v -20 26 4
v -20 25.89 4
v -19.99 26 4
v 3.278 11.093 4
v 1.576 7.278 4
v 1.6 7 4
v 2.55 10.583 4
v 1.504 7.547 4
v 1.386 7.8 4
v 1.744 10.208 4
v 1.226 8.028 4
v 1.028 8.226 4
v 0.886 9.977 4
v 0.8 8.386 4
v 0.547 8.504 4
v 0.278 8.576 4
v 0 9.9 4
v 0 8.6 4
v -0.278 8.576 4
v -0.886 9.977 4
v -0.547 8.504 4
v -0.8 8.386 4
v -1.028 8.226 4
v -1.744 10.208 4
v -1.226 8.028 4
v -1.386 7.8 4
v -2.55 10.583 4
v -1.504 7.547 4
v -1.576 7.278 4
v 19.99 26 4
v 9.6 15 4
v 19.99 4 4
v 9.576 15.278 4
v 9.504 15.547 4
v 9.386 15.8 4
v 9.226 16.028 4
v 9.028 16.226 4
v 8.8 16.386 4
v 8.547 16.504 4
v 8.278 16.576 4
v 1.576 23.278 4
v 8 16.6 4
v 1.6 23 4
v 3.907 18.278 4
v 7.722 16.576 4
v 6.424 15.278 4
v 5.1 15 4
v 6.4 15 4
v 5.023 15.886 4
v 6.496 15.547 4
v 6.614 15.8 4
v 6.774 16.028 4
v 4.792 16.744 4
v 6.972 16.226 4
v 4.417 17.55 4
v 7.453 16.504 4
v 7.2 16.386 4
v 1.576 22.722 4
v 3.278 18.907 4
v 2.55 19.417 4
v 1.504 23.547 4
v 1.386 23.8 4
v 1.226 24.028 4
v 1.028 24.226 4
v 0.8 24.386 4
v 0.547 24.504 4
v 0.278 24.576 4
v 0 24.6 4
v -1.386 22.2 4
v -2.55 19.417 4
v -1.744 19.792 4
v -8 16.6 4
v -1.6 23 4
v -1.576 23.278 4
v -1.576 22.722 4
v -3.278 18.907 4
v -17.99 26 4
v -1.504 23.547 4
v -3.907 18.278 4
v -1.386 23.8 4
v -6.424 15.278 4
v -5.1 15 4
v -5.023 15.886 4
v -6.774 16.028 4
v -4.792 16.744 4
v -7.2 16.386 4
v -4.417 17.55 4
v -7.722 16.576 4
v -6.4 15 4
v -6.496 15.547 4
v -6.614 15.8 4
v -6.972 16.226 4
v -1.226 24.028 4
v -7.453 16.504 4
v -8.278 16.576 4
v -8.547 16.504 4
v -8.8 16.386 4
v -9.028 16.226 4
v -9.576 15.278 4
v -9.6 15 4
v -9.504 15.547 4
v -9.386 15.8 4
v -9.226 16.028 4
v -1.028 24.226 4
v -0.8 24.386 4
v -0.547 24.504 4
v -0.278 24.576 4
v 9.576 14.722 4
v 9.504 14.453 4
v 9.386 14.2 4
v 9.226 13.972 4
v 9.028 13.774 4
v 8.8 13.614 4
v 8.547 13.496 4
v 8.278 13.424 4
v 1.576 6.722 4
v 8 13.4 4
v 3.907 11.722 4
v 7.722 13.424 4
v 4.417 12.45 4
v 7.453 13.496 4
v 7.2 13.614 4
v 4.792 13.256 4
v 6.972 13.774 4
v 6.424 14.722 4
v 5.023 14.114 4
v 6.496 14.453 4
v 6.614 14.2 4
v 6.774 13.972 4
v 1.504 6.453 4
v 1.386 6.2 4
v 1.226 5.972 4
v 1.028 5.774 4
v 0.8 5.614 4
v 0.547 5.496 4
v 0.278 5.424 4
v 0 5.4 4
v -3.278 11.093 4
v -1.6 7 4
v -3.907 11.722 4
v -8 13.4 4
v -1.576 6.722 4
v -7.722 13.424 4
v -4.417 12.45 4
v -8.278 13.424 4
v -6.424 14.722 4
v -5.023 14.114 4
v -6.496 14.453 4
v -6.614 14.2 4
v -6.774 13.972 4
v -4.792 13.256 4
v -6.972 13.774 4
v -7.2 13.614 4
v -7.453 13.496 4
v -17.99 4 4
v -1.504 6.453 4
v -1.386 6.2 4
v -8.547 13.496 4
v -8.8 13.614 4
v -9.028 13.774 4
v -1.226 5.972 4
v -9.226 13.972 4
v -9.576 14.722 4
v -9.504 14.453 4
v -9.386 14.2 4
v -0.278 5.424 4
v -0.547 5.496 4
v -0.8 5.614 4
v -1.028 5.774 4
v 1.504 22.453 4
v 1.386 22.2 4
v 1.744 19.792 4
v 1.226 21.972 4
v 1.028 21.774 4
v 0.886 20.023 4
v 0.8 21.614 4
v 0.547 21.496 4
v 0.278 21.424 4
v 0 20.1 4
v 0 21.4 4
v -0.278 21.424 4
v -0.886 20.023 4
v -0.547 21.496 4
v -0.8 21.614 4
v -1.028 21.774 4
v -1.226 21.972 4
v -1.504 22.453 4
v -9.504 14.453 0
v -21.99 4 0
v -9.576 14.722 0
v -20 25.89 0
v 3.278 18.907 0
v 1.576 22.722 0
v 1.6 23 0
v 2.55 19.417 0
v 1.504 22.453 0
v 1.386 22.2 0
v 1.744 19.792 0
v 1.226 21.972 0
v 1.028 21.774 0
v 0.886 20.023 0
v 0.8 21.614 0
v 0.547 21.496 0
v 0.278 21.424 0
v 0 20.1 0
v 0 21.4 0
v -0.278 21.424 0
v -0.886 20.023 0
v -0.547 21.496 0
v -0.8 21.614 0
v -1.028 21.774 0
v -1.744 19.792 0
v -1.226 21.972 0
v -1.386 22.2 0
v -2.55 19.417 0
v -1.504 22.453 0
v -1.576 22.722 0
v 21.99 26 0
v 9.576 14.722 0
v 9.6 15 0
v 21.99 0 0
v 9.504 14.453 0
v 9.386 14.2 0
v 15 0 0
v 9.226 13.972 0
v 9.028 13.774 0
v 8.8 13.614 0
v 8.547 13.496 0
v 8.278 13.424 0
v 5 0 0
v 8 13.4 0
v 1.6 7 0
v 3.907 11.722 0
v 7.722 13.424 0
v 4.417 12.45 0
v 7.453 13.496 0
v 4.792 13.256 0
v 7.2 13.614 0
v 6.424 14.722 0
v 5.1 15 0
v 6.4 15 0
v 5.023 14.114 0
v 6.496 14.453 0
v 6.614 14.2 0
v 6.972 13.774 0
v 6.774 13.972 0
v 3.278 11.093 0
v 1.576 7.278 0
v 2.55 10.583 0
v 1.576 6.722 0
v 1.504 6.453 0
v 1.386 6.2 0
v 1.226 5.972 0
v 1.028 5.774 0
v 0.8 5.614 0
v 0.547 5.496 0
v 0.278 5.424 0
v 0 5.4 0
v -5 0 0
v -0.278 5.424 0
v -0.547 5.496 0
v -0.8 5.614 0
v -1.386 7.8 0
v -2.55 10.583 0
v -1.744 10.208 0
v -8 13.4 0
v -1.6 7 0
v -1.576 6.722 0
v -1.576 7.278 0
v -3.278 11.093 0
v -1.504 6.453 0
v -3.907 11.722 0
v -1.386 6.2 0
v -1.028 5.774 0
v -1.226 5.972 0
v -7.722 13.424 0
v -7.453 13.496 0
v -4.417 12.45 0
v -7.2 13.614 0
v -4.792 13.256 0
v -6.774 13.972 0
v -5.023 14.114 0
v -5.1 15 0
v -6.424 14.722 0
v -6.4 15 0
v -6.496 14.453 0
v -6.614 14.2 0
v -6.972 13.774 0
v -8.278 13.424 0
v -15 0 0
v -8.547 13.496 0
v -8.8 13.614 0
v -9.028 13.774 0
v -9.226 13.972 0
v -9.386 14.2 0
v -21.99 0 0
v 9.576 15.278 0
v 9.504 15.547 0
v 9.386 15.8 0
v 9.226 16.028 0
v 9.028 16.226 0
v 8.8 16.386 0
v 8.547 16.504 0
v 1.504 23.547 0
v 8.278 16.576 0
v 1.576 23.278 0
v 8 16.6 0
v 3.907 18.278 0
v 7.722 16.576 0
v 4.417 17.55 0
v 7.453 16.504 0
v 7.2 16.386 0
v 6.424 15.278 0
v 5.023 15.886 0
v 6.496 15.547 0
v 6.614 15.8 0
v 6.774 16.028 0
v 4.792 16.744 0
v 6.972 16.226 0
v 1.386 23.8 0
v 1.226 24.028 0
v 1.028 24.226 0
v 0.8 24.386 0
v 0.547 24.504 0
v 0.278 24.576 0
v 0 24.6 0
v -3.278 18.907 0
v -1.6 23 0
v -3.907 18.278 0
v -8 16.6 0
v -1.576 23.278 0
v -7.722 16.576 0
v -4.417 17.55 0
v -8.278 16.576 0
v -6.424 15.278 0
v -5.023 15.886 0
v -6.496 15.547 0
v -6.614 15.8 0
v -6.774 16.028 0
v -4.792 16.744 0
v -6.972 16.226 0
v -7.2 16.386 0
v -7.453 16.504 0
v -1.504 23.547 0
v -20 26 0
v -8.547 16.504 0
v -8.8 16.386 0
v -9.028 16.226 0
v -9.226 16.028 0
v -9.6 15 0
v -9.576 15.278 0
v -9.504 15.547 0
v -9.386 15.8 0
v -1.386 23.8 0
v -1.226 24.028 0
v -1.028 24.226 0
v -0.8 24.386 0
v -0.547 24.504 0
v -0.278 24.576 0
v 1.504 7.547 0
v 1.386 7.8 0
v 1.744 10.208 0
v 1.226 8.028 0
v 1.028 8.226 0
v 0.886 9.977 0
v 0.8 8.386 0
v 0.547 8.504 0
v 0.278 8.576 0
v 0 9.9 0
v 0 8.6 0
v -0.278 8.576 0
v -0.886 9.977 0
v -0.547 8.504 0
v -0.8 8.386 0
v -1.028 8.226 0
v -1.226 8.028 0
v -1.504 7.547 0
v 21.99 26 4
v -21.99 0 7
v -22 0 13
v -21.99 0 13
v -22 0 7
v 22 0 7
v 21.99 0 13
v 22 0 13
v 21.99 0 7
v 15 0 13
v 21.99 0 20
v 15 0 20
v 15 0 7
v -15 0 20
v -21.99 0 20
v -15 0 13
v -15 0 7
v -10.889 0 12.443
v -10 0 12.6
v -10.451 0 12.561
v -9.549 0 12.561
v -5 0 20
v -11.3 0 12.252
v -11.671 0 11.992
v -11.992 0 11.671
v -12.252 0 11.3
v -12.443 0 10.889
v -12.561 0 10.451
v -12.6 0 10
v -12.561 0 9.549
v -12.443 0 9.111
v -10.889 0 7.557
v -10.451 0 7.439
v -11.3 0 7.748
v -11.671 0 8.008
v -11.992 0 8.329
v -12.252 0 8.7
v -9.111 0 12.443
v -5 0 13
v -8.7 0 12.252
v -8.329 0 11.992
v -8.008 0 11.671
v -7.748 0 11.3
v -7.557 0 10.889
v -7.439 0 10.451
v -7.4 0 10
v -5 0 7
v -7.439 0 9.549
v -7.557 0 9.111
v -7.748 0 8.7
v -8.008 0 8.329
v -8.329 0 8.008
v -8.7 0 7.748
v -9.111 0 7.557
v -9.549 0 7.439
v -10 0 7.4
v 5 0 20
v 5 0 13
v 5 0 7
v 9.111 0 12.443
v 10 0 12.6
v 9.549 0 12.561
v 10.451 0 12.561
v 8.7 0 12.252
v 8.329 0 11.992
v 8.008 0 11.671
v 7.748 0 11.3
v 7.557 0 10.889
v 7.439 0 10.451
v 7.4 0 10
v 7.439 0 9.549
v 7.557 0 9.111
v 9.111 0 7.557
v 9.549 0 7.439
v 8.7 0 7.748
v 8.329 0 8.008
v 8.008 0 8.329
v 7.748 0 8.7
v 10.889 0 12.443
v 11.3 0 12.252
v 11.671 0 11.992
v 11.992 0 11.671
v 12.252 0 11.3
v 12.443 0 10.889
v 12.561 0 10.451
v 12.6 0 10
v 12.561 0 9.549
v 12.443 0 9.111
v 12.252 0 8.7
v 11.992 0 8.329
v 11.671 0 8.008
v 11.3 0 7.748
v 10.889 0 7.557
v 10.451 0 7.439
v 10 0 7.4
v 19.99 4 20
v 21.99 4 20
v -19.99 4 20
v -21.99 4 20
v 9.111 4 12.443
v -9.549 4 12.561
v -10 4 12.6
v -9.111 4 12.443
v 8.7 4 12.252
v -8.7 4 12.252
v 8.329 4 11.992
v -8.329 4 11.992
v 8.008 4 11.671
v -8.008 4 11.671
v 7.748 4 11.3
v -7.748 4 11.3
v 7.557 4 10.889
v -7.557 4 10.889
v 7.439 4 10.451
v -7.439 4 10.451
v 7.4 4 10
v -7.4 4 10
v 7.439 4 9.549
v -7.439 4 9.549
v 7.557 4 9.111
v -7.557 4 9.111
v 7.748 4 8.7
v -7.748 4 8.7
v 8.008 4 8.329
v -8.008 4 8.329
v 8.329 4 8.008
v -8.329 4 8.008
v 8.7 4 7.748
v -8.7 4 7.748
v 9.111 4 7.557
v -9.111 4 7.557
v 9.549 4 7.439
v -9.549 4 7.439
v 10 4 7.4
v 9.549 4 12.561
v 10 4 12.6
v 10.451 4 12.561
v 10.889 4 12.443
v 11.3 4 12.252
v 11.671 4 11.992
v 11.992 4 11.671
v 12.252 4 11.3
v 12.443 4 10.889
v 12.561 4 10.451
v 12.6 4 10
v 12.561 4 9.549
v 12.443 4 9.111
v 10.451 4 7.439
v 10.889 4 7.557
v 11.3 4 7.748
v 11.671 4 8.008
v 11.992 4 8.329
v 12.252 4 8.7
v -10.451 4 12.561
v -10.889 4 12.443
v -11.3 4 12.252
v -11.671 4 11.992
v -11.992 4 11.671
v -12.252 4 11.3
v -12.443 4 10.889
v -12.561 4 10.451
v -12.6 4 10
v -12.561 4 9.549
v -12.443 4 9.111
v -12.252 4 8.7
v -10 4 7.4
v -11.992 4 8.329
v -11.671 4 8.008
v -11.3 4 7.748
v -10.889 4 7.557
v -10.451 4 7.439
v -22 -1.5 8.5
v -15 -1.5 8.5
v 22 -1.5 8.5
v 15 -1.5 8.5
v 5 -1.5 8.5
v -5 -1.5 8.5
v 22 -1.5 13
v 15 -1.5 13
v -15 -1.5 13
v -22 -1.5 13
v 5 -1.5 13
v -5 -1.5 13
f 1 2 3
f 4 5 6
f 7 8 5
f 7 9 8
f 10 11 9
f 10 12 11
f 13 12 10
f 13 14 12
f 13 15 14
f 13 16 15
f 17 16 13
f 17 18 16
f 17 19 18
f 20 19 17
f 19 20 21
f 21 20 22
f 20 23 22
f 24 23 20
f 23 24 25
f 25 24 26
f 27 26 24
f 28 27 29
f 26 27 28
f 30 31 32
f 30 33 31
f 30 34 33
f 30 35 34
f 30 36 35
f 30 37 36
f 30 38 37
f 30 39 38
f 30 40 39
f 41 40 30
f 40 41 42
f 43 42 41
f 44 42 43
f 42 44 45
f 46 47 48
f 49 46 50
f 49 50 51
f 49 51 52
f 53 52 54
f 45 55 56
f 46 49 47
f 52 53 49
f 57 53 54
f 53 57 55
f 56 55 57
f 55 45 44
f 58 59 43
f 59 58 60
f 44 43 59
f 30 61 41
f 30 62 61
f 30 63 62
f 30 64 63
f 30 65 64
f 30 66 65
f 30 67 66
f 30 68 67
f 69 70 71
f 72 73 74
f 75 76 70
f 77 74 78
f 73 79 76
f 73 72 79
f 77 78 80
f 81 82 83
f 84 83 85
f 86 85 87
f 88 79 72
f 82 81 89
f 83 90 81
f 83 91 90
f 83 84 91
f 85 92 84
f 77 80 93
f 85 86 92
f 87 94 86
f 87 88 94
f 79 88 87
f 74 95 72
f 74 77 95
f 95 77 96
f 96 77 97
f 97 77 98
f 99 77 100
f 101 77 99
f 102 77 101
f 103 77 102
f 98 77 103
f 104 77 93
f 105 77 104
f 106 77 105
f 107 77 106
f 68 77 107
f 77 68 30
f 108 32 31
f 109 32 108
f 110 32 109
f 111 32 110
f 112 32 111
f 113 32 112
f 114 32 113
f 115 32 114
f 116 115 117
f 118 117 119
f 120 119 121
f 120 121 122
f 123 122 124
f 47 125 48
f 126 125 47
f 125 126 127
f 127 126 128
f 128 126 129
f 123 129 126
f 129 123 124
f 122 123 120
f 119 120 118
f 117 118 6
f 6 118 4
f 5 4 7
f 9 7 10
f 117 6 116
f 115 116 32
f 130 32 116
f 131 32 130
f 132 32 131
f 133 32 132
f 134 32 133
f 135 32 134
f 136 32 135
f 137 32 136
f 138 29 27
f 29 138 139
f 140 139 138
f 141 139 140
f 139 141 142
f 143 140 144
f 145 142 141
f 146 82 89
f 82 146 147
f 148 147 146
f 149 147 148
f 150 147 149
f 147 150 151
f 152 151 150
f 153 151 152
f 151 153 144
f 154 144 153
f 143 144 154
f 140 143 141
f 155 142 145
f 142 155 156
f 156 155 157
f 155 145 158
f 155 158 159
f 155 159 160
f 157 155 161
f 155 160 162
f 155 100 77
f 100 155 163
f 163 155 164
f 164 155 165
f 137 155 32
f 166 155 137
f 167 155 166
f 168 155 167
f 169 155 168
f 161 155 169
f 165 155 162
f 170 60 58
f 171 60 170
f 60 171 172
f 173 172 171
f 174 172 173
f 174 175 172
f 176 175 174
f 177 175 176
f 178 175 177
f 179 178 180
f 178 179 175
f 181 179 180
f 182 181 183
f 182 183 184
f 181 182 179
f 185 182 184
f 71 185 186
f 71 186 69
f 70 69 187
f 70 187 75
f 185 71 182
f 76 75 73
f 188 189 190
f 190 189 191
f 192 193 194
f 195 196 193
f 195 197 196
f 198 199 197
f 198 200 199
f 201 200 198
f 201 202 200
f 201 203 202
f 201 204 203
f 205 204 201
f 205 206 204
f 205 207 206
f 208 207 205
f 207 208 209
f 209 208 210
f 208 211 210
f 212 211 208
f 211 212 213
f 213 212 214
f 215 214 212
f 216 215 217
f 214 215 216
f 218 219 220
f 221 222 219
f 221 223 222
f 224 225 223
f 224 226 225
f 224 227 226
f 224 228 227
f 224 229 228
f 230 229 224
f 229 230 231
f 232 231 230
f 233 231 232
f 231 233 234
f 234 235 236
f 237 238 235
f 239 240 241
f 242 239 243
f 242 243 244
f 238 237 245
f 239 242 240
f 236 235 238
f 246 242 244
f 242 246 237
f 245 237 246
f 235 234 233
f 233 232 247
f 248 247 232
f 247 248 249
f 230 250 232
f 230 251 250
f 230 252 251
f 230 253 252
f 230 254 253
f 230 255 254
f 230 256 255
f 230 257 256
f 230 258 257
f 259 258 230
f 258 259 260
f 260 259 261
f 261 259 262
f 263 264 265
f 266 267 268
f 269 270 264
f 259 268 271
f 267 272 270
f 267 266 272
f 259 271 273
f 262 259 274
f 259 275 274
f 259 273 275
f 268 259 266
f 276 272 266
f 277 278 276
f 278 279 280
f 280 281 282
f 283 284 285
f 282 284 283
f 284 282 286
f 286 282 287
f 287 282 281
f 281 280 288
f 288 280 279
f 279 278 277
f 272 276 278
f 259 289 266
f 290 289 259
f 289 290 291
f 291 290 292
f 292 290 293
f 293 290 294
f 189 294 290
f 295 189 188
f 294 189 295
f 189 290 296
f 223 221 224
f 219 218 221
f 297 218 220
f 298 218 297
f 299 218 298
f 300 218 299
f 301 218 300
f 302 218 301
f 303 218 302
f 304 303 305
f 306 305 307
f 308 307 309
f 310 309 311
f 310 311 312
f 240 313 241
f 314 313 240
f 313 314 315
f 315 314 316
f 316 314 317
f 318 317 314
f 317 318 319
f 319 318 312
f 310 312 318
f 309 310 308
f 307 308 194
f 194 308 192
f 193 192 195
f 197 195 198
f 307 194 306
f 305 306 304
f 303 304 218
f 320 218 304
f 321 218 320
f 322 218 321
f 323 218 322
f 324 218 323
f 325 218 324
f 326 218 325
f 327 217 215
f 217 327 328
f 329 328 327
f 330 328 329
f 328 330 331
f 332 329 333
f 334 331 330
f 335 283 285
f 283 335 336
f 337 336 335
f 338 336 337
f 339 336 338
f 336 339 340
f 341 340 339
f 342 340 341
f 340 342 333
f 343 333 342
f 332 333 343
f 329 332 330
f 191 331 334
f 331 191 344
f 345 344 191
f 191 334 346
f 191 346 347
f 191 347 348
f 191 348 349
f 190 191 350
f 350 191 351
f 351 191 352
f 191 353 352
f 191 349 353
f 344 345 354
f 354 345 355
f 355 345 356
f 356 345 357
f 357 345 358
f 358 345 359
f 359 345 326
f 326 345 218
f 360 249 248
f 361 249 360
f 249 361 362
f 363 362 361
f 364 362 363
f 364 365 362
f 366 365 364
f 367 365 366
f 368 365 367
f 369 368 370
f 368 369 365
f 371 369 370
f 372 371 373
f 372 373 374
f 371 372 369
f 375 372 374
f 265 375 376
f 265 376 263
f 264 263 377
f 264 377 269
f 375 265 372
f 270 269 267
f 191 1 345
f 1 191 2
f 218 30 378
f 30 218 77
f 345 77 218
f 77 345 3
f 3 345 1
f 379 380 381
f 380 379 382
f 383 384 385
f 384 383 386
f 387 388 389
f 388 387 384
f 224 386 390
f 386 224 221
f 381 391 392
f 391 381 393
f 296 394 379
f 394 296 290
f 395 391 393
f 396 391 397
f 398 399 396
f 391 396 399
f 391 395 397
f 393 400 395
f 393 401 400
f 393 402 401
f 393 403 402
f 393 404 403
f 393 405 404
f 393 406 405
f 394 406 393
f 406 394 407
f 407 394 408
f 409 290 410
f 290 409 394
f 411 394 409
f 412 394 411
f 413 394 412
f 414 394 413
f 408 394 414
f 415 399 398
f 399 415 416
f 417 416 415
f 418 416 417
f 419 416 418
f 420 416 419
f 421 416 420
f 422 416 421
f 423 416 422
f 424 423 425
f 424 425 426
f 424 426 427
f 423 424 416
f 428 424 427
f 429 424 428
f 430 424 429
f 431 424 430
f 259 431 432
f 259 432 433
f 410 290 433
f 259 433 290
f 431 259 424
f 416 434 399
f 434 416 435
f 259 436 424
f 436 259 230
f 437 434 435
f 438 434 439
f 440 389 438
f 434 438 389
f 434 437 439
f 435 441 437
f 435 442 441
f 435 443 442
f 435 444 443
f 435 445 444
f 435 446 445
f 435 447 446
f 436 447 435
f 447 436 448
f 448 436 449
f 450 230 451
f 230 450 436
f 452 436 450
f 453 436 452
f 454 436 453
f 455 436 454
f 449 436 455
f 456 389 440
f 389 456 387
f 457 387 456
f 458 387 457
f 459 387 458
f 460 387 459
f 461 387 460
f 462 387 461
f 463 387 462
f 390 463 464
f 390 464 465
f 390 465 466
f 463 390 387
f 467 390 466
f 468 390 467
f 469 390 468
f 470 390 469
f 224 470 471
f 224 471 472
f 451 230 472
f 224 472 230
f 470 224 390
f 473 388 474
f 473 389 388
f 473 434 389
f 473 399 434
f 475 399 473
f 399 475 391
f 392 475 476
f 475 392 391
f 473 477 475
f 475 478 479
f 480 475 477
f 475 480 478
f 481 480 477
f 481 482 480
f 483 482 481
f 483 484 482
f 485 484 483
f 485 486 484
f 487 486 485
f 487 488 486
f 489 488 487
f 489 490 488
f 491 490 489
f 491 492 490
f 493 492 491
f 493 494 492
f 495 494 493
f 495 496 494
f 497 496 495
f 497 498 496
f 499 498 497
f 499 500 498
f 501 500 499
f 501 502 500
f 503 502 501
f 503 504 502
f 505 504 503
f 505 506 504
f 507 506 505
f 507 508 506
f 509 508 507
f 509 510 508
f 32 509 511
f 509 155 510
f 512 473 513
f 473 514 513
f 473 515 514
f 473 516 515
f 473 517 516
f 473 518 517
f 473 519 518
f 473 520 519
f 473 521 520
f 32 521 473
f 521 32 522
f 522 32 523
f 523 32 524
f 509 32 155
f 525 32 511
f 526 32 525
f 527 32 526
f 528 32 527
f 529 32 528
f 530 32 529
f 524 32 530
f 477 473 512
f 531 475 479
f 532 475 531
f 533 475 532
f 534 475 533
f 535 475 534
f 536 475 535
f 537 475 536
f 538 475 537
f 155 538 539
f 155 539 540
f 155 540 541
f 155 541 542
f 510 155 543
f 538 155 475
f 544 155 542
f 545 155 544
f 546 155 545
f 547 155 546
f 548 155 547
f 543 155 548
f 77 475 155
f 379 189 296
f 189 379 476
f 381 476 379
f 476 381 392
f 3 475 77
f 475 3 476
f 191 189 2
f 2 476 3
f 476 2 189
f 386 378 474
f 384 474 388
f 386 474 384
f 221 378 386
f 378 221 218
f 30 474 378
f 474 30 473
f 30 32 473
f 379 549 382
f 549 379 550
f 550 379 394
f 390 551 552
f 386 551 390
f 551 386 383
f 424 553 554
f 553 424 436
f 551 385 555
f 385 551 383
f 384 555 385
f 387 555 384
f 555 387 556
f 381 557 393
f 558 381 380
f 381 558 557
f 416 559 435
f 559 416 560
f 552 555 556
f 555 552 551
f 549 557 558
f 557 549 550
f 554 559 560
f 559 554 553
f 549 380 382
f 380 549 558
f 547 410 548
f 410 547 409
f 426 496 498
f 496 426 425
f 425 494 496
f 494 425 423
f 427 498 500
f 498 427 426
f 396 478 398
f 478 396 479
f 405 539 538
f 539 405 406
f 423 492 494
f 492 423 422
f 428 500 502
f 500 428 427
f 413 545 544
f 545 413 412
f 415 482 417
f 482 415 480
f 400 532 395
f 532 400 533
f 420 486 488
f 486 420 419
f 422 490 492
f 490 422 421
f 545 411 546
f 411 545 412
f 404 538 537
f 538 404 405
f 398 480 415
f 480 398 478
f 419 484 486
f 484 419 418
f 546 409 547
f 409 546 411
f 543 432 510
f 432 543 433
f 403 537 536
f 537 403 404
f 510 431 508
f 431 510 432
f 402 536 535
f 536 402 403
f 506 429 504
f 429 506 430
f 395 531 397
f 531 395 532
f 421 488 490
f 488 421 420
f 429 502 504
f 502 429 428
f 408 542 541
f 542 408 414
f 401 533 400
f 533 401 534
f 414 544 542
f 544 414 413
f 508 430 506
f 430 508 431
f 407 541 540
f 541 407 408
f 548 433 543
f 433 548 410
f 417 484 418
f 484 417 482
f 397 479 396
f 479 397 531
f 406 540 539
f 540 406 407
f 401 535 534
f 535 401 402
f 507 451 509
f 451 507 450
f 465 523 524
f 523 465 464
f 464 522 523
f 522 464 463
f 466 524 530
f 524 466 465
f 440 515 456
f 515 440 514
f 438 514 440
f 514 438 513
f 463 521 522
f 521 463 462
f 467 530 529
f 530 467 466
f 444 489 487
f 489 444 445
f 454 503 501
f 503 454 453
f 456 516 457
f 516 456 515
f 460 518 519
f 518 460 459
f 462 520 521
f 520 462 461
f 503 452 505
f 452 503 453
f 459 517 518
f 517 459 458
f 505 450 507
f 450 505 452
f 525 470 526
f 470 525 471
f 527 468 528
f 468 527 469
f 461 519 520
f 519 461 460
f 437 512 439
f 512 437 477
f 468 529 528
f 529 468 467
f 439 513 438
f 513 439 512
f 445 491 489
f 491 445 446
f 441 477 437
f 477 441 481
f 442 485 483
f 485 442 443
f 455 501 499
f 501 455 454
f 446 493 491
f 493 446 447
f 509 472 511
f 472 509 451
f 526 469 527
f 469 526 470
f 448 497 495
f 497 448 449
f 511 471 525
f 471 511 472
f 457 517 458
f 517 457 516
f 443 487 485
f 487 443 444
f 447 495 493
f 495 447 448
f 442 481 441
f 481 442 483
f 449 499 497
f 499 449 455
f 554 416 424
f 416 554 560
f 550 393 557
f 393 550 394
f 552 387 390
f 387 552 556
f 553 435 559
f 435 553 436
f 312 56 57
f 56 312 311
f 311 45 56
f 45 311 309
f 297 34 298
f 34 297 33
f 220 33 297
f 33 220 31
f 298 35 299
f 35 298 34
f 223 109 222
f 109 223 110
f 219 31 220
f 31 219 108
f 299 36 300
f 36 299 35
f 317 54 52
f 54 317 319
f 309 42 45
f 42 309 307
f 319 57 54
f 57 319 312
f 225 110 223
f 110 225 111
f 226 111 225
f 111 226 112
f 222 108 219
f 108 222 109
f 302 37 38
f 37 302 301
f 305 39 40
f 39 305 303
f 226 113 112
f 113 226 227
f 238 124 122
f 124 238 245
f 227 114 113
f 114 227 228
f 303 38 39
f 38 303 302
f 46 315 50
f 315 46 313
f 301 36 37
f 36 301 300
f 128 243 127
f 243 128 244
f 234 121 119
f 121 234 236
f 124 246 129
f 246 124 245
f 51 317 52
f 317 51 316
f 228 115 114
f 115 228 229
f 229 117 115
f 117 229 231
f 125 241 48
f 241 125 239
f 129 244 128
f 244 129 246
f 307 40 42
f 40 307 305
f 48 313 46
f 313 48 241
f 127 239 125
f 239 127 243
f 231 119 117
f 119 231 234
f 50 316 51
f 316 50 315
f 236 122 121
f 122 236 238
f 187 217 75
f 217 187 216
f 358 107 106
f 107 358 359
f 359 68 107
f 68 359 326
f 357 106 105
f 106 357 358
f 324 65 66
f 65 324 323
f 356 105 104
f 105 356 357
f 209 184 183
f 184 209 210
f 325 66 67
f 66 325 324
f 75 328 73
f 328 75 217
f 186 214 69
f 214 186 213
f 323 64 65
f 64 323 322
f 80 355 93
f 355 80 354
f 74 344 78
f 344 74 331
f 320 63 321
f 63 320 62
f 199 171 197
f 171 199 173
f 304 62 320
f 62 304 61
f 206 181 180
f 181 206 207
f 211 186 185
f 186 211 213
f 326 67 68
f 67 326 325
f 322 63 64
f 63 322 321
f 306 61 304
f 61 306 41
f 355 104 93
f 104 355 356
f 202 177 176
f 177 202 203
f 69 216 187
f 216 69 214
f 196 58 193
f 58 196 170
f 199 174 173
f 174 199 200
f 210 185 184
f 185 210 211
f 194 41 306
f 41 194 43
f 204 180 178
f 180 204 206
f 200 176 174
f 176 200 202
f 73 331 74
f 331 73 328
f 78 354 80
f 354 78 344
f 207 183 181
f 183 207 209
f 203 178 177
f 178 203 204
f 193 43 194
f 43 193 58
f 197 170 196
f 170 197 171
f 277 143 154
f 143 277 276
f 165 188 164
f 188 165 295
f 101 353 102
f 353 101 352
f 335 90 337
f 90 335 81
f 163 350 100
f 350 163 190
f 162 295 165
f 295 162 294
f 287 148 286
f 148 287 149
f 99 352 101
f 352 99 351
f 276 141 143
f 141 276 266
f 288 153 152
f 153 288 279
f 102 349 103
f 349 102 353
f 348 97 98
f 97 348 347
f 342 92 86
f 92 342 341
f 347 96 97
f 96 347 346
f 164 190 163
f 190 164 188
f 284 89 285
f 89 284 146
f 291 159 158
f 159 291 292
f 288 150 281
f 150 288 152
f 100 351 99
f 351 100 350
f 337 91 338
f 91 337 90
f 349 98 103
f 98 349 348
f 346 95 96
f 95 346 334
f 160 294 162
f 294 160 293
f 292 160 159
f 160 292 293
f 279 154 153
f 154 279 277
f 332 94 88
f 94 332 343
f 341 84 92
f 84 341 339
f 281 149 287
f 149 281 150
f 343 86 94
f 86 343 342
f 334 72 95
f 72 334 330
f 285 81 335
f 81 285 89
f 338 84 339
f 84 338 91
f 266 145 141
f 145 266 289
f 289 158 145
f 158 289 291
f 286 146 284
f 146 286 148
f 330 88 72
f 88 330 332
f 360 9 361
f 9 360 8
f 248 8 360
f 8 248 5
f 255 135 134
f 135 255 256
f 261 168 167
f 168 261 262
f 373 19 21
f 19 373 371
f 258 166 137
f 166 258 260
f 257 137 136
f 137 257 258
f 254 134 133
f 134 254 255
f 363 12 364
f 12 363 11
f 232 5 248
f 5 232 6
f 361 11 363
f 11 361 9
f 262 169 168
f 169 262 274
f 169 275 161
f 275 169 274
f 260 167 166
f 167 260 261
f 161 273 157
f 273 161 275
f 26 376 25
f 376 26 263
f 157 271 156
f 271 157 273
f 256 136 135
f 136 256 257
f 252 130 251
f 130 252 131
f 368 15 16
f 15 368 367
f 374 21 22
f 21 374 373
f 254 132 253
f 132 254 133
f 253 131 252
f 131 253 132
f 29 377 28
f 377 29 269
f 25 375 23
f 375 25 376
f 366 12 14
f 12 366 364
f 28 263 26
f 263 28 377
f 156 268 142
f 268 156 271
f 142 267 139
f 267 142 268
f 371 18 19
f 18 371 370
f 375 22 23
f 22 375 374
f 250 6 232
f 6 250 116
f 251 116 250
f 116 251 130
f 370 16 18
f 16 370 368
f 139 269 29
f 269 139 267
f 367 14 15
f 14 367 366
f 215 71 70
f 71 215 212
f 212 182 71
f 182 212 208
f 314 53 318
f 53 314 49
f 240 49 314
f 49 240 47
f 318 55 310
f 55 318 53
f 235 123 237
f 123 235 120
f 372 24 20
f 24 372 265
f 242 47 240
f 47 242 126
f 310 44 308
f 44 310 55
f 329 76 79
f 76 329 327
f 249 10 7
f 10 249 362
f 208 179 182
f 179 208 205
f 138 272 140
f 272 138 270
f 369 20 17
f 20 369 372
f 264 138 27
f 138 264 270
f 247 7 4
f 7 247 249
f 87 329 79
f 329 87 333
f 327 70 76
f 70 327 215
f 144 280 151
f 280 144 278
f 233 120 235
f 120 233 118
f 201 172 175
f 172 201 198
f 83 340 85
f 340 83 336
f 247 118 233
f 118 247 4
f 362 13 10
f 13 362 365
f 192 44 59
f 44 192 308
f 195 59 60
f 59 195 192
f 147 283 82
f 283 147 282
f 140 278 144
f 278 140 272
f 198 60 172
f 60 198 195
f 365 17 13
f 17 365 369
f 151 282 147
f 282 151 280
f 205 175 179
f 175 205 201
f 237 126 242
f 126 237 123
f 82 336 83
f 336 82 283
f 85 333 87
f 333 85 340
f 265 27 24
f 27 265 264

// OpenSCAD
$fn=36;

rail_height=20; //2020 rail
slot_width=6;
notch_depth=1.5;
rail_screw_diameter=5.2; //M5 + margin

nut_diameter=22;
axle_hole = 10.2; //Just 8mm axle, but nut has 10mm collar, some margin for it.
nut_screw_diameter=3.2; //M3 + margin
nut_screw_distance=16;

slot_nut_length=10;

bracket_length=40;
bracket_width=26;
endplate_thickness=2;
bracket_thickness=4;
e=0.01;



difference() {
    union() {
        
       //Base parts of bracket
       translate([-bracket_length/2,0,0]) {
           cube([bracket_length, bracket_width, bracket_thickness]); 
           cube([bracket_length, bracket_thickness, rail_height]);

       }
       
       //Endplates
       for(i=[-1,1]) {
           translate([i*(bracket_length/2-e), 0, 0]) hull() {
               cube([endplate_thickness, bracket_width, bracket_thickness]);
               scale([i,1,1]) cube([endplate_thickness, bracket_thickness, rail_height]);
           }
       }       
       
       //Notch into rail
       notch_points=[[0,-slot_width/2],[notch_depth,-slot_width/2+notch_depth],[notch_depth,slot_width/2],[0,slot_width/2]];
       notch_path=[[0,1,2,3,0]];
       
       translate([bracket_length/2+endplate_thickness,0,rail_height/2]) rotate([90,0,-90])  linear_extrude(height=bracket_length+endplate_thickness*2) polygon(points=notch_points, paths=notch_path, convexity=2);
       
    }
    
    union() {
        //Holes for mounting bolts to rail
        for(i=[-1,1])
            translate([i*bracket_length/4, -e, rail_height/2]) rotate([-90,0,0]) cylinder(d=rail_screw_diameter, h=bracket_thickness+2*e);
        
        //Cutout in notch for slot nuts
         for(i=[-1,1])
            translate([i*bracket_length/4-slot_nut_length/2,-notch_depth-e,0]) cube([slot_nut_length,notch_depth+e,rail_height]);
        
        translate([0,bracket_width-nut_diameter/2, -e]) {
            
            //Axle hole
            cylinder(d=axle_hole, h=bracket_thickness+2*e);
            
            //Mounting screws
            for(v=[0:90:270]) {
                rotate([0,0,v]) translate([nut_screw_distance/2,0,0]) cylinder(d=nut_screw_diameter, h=bracket_thickness+2*e);
            }
        }
        
    }
}
